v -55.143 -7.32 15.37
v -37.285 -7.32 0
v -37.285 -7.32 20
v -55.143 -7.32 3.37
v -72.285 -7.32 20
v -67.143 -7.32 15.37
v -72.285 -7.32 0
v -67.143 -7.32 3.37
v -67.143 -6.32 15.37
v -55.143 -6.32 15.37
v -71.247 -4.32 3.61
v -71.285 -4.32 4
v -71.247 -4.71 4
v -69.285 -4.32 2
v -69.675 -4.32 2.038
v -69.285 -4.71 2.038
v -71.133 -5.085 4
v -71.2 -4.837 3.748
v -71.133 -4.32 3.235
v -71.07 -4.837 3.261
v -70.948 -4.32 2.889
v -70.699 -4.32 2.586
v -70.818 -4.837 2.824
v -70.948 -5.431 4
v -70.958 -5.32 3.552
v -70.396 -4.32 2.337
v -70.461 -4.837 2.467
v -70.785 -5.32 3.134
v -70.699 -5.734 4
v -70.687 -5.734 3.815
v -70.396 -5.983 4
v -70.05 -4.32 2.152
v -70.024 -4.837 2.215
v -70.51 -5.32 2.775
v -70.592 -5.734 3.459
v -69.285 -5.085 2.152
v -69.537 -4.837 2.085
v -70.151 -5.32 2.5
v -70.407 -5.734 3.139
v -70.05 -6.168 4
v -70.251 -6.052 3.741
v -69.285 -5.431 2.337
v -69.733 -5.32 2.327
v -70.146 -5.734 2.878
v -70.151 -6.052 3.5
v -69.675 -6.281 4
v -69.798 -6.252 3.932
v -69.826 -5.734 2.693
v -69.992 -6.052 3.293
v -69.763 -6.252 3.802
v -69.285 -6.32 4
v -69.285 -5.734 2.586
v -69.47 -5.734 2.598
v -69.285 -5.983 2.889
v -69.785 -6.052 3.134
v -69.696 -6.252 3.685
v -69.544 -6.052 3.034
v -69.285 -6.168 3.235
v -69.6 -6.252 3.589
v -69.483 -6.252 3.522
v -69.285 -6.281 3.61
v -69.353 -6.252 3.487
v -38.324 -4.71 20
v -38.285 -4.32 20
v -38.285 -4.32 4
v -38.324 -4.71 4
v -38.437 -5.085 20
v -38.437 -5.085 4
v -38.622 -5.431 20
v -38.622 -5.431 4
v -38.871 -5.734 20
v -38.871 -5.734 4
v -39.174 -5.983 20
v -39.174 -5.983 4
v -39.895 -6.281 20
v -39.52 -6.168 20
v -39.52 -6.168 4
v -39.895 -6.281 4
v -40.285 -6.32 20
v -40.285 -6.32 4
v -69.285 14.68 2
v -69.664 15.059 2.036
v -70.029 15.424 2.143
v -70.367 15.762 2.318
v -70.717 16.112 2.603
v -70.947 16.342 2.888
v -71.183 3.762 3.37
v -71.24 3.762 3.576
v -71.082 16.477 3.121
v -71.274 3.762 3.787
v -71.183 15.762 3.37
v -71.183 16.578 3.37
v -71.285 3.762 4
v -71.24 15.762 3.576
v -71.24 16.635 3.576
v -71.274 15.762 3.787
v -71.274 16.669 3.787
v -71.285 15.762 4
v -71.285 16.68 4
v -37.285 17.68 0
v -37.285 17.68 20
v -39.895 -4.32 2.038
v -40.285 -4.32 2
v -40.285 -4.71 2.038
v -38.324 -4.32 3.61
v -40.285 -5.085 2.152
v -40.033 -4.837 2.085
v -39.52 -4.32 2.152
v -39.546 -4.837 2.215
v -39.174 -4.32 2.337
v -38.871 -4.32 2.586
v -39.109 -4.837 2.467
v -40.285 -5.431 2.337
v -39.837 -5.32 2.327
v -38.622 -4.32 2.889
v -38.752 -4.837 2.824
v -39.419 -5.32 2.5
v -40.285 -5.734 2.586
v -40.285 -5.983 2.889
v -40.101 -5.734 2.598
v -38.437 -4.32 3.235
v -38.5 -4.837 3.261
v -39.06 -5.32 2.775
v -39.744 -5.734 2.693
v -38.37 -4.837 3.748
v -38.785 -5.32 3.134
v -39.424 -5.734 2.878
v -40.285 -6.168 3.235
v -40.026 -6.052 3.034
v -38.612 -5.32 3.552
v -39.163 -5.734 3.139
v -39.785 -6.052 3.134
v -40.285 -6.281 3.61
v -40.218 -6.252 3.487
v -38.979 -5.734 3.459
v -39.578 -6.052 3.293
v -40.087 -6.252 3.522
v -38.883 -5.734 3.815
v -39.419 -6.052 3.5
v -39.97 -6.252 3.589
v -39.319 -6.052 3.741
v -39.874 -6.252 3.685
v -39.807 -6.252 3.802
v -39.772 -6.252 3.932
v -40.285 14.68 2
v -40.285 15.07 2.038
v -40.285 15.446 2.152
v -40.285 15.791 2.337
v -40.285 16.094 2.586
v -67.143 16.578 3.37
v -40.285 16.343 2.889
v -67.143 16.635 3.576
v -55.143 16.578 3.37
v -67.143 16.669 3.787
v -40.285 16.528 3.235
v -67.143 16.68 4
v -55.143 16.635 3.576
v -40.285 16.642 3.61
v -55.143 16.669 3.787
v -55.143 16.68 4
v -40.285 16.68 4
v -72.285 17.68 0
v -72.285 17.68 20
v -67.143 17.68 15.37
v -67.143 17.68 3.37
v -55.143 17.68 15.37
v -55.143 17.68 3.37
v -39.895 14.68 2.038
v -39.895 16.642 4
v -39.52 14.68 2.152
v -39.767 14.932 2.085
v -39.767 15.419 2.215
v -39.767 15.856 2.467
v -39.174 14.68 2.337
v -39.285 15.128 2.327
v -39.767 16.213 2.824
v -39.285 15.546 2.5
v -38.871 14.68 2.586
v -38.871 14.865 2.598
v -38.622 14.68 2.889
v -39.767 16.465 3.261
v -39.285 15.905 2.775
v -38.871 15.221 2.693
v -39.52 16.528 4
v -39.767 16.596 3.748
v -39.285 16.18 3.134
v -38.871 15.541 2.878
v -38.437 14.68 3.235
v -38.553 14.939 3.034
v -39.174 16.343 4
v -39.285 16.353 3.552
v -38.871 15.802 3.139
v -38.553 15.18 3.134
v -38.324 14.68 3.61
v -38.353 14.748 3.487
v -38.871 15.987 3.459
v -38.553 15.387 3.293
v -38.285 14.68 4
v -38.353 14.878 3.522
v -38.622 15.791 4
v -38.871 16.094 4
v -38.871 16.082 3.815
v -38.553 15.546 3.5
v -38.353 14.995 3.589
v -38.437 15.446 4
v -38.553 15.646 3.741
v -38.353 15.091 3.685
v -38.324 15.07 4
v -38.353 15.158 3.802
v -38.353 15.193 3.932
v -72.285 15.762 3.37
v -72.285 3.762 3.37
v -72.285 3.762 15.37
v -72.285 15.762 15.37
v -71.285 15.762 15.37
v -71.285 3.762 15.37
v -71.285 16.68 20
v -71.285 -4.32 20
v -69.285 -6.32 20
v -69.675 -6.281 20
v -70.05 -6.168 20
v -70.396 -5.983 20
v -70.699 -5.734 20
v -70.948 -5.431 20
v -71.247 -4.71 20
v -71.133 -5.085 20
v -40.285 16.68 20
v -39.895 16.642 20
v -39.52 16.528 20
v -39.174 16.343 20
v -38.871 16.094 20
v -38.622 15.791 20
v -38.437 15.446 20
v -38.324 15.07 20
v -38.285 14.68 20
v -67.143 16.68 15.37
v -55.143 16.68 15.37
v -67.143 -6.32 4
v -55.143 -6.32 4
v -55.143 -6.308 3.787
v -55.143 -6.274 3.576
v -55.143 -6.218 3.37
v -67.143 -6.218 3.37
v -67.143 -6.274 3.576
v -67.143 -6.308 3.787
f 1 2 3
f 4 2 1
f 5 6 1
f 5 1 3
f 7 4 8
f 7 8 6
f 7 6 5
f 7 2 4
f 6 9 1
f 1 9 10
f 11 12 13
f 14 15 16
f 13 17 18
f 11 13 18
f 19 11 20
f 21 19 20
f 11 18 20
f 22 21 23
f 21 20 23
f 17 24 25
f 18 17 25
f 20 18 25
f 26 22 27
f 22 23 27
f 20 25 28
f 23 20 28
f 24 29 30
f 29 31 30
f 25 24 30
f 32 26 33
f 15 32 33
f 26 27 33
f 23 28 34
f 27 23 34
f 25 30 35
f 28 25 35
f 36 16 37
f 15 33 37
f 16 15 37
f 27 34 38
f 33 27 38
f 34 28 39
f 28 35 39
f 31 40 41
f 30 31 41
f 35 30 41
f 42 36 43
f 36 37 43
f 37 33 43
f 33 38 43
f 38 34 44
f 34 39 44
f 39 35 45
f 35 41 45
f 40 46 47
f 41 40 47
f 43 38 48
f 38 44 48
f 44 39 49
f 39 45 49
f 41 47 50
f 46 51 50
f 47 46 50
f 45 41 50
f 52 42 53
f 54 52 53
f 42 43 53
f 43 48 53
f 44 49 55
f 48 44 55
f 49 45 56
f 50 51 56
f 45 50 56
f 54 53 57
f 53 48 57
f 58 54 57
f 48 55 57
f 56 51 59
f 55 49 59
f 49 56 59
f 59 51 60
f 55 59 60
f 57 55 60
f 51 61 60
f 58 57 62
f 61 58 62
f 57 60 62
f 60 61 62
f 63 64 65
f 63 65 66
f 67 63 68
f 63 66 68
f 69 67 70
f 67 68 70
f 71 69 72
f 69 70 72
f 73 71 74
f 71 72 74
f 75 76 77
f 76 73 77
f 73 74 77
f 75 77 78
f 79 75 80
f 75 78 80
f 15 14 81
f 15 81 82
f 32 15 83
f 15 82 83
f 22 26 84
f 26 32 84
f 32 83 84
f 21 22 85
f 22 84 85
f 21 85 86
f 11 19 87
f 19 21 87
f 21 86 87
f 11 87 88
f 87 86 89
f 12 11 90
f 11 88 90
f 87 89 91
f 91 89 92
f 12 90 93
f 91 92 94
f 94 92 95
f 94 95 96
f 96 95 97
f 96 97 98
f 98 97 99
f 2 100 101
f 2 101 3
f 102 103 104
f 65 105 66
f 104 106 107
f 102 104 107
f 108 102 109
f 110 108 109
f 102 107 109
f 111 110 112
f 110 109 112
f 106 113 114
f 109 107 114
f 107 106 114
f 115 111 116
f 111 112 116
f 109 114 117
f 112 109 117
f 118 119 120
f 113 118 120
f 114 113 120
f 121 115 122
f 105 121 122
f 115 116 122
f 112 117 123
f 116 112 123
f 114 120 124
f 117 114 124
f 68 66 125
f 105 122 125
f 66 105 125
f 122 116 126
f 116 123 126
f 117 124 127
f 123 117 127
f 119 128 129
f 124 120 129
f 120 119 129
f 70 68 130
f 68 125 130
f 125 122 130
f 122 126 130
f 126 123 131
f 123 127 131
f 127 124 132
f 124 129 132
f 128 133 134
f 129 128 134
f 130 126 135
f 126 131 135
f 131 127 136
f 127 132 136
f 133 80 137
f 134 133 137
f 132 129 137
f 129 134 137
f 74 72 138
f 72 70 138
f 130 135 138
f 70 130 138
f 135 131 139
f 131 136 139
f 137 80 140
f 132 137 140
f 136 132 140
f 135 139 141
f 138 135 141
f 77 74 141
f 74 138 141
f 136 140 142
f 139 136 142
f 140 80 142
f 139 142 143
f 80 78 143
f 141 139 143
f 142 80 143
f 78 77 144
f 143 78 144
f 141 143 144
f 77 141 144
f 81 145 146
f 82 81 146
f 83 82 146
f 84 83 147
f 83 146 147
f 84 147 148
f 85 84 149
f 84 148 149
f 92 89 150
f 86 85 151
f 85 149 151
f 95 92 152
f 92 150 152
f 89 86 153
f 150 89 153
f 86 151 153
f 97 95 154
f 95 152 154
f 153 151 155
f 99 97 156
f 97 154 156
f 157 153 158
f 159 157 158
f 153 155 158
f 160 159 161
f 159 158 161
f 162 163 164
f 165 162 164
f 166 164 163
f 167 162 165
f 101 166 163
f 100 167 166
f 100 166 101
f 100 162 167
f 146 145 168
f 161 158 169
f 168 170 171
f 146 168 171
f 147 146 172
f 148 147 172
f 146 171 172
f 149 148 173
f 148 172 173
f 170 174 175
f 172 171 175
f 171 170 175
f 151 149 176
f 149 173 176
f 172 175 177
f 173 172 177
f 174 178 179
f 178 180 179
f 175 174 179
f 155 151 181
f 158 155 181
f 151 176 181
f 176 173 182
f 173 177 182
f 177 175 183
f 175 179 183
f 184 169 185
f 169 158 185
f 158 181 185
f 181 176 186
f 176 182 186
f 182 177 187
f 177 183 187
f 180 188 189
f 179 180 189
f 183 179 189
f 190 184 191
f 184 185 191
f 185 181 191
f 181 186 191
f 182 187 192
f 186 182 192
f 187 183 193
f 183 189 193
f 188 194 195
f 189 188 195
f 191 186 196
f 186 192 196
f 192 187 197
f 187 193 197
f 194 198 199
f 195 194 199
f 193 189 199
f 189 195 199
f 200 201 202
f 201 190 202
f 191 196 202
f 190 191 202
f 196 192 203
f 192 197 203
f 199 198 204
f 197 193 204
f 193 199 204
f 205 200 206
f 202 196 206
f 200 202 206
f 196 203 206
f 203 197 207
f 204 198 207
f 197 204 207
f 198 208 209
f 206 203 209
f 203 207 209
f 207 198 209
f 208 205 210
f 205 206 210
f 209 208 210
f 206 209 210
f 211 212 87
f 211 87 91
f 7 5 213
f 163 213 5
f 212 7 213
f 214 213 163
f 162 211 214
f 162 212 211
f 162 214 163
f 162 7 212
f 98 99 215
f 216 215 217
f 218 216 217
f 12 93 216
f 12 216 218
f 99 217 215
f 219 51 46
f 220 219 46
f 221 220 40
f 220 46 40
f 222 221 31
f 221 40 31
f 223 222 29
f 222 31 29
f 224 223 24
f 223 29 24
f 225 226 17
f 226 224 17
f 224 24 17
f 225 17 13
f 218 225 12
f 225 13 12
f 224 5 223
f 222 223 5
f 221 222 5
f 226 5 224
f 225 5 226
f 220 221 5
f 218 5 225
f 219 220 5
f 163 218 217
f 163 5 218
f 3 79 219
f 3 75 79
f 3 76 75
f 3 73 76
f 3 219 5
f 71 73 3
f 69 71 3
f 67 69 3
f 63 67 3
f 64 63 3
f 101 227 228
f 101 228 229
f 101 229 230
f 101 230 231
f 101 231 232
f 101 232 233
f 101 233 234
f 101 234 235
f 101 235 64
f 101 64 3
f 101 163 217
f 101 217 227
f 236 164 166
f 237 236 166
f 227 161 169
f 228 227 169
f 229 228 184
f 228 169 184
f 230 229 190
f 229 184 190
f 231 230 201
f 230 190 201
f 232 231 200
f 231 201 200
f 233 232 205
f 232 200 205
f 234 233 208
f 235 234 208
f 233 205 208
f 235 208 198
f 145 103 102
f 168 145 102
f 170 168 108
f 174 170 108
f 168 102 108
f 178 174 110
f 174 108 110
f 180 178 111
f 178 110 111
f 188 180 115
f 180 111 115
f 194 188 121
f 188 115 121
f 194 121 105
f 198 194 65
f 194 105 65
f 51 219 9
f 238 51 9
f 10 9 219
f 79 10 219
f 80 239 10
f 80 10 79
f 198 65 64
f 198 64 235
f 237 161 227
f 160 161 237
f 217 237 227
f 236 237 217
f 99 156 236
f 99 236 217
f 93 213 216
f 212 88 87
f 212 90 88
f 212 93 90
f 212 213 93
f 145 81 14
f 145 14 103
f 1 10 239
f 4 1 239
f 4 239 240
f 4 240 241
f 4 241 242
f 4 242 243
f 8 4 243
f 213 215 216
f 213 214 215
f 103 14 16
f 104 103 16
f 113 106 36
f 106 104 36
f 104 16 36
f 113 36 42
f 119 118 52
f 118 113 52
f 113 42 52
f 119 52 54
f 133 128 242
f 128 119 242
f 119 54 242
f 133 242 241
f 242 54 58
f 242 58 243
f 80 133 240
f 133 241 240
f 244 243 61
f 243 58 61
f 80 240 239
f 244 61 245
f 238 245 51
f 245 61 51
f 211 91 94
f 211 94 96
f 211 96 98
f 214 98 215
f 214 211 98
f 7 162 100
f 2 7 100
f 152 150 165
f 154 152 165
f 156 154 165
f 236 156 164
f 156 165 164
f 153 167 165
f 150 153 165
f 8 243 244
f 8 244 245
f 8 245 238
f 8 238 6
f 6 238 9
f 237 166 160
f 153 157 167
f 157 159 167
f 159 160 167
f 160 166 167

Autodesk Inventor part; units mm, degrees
ref_plane "YZ Plane" through (0, 0, 0) normal (1, 0, 0) x (0, 1, 0)
ref_plane "XZ Plane" through (0, 0, 0) normal (0, 1, 0) x (-1, 0, 0)
ref_plane "XY Plane" through (0, 0, 0) normal (0, 0, 1) x (1, 0, 0)
ref_plane "Work Plane1" through (0, 0, 0) normal (0, 0, 1) x (1, 0, 0)
sketch "Sketch1" plane through (0, 0, 0) normal (0, 0, 1) x (1, 0, 0)
  arc A0 (-74.415, -11.0527) -> (-74.415, -5.9883) centre (-76.6839, -8.5205) ccw projected
  line L0 (-74.415, -11.3137) -> (-74.415, -11.0527) projected
  line L1 (30, -11.3137) -> (-74.415, -11.3137) projected
  line L2 (30, 11.3137) -> (30, -11.3137) projected
  line L3 (25, 11.3137) -> (30, 11.3137) projected
  line L4 (0, 11.3137) -> (25, 11.3137) projected
  line L5 (-25, 11.3137) -> (0, 11.3137) projected
  line L6 (-30, 11.3137) -> (-25, 11.3137) projected
  line L7 (-30, 16.3137) -> (-30, 11.3137) projected
  line L8 (-30, 24.6863) -> (-30, 16.3137) projected
  line L9 (-74.415, 24.6863) -> (-30, 24.6863) projected
  line L10 (-74.415, -5.9883) -> (-74.415, 24.6863) projected
  line L11 (-72.2851, 17.6802) -> (-37.2851, 17.6802)
  line L12 (-37.2851, 17.6802) -> (-37.2851, -7.3198)
  line L13 (-37.2851, -7.3198) -> (-72.2851, -7.3198)
  line L14 (-72.2851, -7.3198) -> (-72.2851, 17.6802)
  point P0 (0, 0)
  dimension "d0" = 35
  dimension "d1" = 25
extrude "Extrusion1" add sketch "Sketch1" along normal blind 2 contours L11 L12 L13 L14
sketch "Sketch2" plane through (0, 0, 2) normal (0, 0, 1) x (1, 0, 0)
  line L0 (-37.2851, 17.6802) -> (-72.2851, 17.6802) projected
  line L1 (-72.2851, 17.6802) -> (-72.2851, -7.3198) projected
  line L2 (-72.2851, -7.3198) -> (-37.2851, -7.3198) projected
  line L3 (-37.2851, -7.3198) -> (-37.2851, 17.6802) projected
  line L4 (-38.2851, 16.6802) -> (-71.2851, 16.6802)
  line L5 (-71.2851, 16.6802) -> (-71.2851, -6.3198)
  line L6 (-71.2851, -6.3198) -> (-38.2851, -6.3198)
  line L7 (-38.2851, -6.3198) -> (-38.2851, 16.6802)
  point P0 (0, 0)
  dimension "d4" = 1
extrude "Extrusion2" add sketch "Sketch2" along normal blind 18
sketch "Sketch3" plane through (-72.2851, -7.3198, 0) normal (-1, 0, 0) x (0, 0, 1)
  line L0 (0, 0) -> (0, 25) projected
  line L1 (0, 0) -> (20, 0) projected
  line L2 (20, 25) -> (20, 0) projected
  line L3 (0, 25) -> (20, 25) projected
  line L4 (3.37, 23.0819) -> (15.37, 23.0819)
  line L5 (15.37, 23.0819) -> (15.37, 11.0819)
  line L6 (15.37, 11.0819) -> (3.37, 11.0819)
  line L7 (3.37, 11.0819) -> (3.37, 23.0819)
  line L8 (3.37, 23.0819) -> (15.37, 11.0819) construction
  line L9 (15.37, 23.0819) -> (3.37, 11.0819) construction
  point P0 (0, 7.3198)
  point P1 (9.37, 17.0819)
  dimension "d7" = 12
  dimension "d8" = 12
extrude "Extrusion3" cut sketch "Sketch3" against normal blind 15 contours L4 L5 L6 L7
sketch "Sketch4" plane through (-72.2851, 17.6802, 0) normal (0, 1, 0) x (1, 0, 0)
  line L0 (0, 0) -> (35, 0) projected
  line L1 (0, 0) -> (0, -20) projected
  line L2 (35, -20) -> (0, -20) projected
  line L3 (35, 0) -> (35, -20) projected
  line L4 (17.1417, -3.37) -> (5.1417, -3.37)
  line L5 (5.1417, -3.37) -> (5.1417, -15.37)
  line L6 (5.1417, -15.37) -> (17.1417, -15.37)
  line L7 (17.1417, -15.37) -> (17.1417, -3.37)
  line L8 (17.1417, -3.37) -> (5.1417, -15.37) construction
  line L9 (5.1417, -3.37) -> (17.1417, -15.37) construction
  point P0 (72.2851, 0)
  point P1 (11.1417, -9.37)
  point P2 (0, -3.37)
  dimension "d11" = 12
  dimension "d12" = 12
  dimension "d15" = 0
extrude "Extrusion4" cut sketch "Sketch4" against normal through all contours L7 L6 L5 L4
fillet "Fillet1" radius 2 7 edges at (-71.2851, 5.1802, 2) (-54.7851, 16.6802, 2) (-38.2851, 5.1802, 2) (-54.7851, -6.3198, 2) (-38.2851, -6.3198, 11) (-71.2851, -6.3198, 11) (-38.2851, 16.6802, 11)
properties part number "10_MiniSPIM_Samplechamber"
